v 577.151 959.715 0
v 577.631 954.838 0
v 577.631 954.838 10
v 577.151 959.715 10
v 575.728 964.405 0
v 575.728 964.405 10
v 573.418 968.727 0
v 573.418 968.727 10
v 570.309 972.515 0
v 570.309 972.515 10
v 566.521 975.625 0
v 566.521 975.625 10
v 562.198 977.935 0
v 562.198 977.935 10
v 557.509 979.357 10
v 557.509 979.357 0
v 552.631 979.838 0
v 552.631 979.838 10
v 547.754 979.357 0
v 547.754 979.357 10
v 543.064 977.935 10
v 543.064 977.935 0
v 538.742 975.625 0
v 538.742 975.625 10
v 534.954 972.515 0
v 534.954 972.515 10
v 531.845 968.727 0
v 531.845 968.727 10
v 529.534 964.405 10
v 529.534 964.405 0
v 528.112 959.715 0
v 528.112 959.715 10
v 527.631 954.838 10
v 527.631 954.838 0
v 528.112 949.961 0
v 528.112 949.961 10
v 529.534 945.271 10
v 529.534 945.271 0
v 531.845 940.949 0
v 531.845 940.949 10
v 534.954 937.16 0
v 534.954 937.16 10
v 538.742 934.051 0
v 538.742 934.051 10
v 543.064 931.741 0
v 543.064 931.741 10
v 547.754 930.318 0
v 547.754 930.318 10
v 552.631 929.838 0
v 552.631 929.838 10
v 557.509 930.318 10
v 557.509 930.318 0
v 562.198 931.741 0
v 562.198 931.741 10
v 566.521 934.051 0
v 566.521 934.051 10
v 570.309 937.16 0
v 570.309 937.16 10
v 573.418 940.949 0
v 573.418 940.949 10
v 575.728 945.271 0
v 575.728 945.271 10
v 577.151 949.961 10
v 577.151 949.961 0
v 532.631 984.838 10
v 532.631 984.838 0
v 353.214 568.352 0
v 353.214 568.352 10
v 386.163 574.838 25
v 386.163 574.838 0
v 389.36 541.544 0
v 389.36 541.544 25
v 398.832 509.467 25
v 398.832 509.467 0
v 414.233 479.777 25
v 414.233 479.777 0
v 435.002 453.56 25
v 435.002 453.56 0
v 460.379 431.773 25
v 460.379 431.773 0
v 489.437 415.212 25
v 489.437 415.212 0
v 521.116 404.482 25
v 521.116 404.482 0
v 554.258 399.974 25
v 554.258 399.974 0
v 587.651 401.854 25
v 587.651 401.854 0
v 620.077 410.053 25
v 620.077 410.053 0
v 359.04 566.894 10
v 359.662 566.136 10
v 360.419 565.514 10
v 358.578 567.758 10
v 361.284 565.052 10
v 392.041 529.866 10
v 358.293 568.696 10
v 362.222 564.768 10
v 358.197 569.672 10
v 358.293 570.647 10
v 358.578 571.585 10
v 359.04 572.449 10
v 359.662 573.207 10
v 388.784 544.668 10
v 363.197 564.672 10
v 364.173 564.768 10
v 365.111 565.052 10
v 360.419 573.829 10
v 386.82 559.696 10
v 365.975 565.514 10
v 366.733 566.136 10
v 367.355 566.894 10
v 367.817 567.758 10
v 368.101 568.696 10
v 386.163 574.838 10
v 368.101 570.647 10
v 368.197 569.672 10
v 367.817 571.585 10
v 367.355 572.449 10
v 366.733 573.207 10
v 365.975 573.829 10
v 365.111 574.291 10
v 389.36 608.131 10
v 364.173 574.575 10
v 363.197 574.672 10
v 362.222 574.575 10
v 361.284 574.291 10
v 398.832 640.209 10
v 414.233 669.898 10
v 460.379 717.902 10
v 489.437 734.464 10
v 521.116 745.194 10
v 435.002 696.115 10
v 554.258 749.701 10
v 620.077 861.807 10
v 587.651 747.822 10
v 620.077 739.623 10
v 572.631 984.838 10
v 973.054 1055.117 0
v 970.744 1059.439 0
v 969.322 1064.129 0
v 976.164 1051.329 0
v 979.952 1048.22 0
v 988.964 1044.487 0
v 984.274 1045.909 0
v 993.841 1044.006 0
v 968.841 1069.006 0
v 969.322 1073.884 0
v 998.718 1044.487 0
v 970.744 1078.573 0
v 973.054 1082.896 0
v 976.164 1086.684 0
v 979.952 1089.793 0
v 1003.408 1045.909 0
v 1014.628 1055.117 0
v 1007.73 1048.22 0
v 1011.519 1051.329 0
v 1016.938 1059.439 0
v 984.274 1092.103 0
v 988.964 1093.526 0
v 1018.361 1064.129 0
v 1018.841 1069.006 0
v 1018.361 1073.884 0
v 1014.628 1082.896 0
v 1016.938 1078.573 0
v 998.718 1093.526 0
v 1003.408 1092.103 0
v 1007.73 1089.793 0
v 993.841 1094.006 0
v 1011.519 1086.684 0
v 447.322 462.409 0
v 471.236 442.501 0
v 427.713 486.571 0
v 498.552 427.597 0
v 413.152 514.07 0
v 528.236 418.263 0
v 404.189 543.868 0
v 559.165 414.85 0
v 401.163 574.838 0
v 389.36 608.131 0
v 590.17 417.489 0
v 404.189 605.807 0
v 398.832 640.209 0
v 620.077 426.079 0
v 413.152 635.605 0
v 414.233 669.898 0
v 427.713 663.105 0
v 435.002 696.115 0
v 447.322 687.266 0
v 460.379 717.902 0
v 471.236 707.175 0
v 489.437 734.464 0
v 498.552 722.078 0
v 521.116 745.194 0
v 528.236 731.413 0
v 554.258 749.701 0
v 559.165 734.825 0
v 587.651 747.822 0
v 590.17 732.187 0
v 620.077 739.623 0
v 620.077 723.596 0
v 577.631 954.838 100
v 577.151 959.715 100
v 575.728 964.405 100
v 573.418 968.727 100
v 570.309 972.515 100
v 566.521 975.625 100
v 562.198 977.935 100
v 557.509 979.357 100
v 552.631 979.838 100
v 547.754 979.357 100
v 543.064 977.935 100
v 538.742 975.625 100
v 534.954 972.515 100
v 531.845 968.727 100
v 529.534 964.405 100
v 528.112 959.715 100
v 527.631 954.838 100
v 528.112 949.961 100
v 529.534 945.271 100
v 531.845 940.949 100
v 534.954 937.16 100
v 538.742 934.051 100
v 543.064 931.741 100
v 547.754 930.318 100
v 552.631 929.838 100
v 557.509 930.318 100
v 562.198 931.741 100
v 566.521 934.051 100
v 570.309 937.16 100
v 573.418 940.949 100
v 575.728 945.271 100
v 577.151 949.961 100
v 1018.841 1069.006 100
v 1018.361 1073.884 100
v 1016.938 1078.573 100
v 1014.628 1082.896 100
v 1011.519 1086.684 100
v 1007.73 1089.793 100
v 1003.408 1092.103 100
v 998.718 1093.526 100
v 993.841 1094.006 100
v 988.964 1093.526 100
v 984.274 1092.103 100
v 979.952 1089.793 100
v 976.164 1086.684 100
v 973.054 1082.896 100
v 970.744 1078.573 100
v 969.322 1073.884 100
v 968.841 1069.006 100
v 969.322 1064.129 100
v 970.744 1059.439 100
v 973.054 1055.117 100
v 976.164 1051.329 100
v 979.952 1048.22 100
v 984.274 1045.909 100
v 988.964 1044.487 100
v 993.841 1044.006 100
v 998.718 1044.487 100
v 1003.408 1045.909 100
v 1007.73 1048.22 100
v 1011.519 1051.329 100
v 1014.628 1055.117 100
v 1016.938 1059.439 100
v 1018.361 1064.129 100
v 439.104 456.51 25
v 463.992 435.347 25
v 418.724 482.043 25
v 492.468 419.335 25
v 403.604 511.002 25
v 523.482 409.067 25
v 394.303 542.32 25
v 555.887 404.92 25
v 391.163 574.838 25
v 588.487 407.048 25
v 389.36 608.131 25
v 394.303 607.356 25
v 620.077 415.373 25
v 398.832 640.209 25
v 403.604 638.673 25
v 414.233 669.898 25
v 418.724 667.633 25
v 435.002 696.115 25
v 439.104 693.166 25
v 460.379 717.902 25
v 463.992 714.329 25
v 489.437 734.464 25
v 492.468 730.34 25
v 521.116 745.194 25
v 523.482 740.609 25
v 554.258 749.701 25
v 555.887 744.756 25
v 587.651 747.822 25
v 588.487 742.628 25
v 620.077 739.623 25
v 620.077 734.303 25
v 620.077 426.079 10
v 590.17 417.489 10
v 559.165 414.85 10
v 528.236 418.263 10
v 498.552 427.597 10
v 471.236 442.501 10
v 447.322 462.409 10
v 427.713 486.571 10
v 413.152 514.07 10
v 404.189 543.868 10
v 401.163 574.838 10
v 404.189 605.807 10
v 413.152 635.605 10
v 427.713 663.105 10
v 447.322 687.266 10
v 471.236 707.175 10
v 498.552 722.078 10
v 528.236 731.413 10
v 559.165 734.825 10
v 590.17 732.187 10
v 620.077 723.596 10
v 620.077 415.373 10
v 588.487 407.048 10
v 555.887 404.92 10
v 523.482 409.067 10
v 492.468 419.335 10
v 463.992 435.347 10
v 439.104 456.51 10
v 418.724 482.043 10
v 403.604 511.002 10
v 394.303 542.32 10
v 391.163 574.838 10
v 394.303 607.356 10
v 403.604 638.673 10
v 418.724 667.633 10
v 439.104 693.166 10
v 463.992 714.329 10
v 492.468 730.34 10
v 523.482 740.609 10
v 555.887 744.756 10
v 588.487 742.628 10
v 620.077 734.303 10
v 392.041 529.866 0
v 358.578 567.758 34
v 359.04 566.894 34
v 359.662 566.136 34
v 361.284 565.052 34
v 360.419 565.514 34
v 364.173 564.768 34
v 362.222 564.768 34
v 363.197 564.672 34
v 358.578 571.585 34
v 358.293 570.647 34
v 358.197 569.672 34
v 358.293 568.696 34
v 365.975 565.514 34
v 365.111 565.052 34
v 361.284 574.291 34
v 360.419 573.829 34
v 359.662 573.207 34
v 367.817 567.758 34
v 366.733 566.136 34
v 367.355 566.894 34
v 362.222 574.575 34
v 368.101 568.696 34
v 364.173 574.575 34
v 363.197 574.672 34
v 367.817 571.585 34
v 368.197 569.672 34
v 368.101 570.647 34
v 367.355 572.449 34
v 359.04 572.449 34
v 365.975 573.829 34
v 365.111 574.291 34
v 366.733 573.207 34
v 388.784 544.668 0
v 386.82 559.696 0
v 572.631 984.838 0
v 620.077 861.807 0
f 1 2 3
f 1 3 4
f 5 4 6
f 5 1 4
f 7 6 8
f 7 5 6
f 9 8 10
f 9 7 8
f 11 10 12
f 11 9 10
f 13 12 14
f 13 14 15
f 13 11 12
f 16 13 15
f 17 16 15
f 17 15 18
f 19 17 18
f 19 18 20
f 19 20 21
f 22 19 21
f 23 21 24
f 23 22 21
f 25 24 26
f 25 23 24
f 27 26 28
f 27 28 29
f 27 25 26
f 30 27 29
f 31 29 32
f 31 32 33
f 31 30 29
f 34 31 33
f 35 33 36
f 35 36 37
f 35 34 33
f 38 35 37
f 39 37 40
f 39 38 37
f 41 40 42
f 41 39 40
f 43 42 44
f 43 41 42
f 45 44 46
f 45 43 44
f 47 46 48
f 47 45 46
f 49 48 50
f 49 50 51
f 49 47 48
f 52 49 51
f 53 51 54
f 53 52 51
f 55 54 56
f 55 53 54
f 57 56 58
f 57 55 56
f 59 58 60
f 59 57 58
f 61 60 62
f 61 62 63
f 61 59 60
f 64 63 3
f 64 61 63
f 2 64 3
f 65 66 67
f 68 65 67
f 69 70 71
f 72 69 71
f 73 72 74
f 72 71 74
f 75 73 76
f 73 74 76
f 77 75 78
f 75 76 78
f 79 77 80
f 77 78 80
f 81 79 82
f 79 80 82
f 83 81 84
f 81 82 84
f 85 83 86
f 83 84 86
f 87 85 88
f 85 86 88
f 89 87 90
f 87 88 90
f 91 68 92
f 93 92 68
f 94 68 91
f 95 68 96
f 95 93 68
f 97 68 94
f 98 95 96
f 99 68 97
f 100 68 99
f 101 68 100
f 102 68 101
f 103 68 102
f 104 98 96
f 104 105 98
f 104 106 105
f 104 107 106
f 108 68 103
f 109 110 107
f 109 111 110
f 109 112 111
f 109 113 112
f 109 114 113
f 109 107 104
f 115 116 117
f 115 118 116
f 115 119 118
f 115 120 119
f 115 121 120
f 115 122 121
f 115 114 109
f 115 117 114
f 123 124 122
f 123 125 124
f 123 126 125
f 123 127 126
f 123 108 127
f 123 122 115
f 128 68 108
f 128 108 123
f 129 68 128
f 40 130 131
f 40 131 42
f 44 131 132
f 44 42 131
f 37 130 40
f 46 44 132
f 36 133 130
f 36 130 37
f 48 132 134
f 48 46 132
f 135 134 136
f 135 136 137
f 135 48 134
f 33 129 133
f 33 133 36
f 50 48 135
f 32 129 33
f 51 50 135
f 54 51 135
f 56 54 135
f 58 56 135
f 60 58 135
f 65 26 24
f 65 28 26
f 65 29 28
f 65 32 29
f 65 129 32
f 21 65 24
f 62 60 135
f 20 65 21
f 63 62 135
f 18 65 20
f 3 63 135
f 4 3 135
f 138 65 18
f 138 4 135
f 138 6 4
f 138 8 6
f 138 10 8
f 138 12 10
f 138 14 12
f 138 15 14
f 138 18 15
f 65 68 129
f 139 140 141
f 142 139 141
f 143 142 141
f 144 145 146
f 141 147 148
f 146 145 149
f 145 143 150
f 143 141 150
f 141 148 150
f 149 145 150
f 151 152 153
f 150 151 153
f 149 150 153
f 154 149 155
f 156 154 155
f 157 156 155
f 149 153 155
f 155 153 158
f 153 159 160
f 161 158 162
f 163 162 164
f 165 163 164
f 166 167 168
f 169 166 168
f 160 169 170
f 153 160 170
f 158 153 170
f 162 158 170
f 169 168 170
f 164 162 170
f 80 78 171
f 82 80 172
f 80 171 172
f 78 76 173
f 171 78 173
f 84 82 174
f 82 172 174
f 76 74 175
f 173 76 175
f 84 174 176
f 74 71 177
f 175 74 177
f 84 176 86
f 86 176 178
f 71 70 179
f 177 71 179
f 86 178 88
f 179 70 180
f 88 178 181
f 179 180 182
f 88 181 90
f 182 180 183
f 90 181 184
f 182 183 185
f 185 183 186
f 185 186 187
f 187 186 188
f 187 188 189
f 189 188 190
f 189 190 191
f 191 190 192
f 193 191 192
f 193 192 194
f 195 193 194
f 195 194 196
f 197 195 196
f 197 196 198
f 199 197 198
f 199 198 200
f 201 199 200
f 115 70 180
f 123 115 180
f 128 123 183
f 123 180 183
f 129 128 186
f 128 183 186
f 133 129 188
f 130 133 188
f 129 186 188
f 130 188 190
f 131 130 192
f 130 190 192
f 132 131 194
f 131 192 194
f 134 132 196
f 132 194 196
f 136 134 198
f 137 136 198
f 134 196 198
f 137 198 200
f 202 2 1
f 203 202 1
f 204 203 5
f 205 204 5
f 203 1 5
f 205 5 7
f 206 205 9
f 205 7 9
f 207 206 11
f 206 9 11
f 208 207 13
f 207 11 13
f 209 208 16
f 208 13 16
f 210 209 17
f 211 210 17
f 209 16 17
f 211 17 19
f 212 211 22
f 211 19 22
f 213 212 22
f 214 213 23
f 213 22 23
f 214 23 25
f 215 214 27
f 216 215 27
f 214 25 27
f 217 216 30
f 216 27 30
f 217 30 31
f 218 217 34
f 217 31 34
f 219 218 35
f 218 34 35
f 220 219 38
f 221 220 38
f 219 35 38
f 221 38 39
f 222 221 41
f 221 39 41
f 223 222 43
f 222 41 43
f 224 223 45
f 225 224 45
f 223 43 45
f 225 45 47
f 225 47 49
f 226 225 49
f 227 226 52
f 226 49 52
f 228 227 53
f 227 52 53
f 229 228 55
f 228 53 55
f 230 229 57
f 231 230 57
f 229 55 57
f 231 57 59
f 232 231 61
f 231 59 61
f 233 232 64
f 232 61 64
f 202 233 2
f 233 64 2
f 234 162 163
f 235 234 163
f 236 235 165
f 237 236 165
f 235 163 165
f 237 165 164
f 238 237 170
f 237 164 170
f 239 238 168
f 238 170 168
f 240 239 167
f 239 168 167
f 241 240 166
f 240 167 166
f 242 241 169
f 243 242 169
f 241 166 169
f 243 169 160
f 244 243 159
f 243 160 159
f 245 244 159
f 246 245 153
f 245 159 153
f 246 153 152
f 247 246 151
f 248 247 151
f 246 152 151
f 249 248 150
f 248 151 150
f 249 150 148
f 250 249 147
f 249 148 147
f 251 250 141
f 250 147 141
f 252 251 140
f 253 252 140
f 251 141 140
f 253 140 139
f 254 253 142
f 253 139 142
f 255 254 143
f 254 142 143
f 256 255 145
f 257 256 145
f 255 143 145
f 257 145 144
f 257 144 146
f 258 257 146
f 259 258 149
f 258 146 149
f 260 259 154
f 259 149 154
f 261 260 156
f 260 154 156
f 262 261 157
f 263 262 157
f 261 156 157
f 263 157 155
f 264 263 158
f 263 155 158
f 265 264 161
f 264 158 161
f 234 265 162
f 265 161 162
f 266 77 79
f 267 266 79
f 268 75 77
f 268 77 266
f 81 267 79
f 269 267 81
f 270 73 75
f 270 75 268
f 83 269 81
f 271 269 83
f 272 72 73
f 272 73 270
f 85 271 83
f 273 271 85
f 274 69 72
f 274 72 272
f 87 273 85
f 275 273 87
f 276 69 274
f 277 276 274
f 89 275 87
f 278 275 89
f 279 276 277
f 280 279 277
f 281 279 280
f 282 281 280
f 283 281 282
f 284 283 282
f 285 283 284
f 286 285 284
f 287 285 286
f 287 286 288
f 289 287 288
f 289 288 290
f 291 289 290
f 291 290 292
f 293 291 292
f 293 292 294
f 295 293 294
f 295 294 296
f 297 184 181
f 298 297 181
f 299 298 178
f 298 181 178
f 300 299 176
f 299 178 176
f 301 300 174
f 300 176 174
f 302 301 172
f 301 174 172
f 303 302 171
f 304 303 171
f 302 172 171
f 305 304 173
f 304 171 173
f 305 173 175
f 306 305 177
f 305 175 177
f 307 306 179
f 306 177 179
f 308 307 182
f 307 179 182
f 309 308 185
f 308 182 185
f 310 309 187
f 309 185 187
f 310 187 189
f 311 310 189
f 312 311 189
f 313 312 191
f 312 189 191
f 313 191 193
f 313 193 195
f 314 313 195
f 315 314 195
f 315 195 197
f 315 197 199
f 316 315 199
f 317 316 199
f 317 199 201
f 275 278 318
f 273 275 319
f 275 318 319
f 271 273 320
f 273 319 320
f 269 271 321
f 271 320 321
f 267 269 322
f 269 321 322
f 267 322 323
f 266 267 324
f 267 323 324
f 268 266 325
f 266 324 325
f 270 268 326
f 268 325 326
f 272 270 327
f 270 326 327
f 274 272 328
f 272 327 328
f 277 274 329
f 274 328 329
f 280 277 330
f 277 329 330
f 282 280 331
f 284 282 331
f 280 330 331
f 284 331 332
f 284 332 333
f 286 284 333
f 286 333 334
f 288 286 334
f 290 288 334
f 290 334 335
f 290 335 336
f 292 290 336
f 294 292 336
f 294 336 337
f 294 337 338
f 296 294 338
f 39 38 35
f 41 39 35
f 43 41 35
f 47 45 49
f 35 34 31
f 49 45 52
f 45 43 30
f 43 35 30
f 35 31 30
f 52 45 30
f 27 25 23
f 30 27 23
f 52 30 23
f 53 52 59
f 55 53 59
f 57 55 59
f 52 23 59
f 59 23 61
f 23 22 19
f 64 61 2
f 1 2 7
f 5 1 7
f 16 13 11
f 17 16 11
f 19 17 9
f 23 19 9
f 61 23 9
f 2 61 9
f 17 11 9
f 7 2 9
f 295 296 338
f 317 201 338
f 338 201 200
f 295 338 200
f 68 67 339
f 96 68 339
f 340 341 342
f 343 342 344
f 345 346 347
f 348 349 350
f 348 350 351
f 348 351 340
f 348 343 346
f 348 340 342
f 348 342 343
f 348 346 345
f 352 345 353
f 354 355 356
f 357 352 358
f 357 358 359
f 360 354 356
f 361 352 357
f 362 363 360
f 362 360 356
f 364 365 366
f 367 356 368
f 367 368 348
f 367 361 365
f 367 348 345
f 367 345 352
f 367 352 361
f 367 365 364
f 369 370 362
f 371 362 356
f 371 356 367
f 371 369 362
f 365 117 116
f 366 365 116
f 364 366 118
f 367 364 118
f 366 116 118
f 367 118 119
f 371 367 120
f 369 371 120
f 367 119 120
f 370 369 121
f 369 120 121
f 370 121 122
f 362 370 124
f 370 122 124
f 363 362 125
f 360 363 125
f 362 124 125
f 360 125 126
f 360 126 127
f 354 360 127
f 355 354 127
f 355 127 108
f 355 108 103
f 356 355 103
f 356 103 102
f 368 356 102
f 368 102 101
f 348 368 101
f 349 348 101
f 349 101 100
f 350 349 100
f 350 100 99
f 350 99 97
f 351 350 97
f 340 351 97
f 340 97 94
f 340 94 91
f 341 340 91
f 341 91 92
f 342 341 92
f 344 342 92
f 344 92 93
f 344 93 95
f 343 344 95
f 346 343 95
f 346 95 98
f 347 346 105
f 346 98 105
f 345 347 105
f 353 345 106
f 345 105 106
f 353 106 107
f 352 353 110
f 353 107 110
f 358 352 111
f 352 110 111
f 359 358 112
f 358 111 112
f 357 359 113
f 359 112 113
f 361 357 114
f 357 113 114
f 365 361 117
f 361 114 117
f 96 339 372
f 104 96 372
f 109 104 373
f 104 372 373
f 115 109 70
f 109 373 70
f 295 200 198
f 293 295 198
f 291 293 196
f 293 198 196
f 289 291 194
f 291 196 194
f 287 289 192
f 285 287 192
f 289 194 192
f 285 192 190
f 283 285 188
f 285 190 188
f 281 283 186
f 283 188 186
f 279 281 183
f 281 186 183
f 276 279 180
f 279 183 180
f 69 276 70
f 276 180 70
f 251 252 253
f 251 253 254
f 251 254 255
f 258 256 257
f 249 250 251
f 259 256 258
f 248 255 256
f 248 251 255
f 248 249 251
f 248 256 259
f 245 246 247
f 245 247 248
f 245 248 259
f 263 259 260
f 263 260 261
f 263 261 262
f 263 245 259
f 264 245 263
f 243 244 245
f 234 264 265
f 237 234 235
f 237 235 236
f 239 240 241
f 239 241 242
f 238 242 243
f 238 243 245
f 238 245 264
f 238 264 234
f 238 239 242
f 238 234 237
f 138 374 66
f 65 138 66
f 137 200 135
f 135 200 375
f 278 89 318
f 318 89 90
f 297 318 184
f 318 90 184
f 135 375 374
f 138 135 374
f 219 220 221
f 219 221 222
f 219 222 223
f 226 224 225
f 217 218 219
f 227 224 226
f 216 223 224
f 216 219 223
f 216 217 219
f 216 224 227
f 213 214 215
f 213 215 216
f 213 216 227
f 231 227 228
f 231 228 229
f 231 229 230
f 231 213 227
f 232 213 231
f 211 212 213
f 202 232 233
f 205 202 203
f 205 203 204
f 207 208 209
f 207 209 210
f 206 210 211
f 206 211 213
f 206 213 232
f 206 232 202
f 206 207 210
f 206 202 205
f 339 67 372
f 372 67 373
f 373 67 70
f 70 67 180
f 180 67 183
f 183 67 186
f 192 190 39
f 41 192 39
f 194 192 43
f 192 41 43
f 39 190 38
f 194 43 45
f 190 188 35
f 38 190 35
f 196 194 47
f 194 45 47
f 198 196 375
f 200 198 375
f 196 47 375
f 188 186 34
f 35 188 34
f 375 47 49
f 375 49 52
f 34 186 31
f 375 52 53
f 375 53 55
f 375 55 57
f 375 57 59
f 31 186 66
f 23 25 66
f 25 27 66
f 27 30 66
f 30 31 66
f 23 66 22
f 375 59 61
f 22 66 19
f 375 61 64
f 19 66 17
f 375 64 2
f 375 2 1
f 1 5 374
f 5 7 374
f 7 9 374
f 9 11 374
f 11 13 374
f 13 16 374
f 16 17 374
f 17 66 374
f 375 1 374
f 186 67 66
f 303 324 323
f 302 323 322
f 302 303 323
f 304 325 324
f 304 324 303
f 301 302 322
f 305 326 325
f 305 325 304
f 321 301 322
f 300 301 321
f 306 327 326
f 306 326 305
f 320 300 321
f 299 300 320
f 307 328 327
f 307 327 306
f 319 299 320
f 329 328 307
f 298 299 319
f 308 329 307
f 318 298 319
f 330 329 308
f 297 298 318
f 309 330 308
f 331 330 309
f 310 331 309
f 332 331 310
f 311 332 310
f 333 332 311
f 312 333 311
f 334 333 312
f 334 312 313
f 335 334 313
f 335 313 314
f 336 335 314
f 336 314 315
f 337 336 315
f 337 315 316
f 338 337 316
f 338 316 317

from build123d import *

# Parameters (mm, degrees)
F1_DEPTH = 10
F2_DEPTH = 25
F0_R     = 25
F3_DEPTH = 100
F0_R_2   = 5
F4_DEPTH = 10
F5_DEPTH = 34
F6_DEPTH = 100


# Not quite as in the source:
# - a feature names something its author has since deleted; it is built from what else it names


with BuildPart() as f1:
    # F0 (on Top) → F1 (new body)
    with BuildSketch(Plane.XY):
        with BuildLine():
            Line((620.0774312019, 723.5964589473), (620.0774312019, 734.3029628668))
            ThreePointArc((620.0774312019, 734.3029628668), (391.1634666106, 574.8377792808), (620.0774312019, 415.3725956948))
            Line((620.0774312019, 415.3725956948), (620.0774312019, 426.0790996143))
            ThreePointArc((620.0774312019, 426.0790996143), (401.1634666106, 574.8377792808), (620.0774312019, 723.5964589473))
        make_face()
    extrude(amount=F1_DEPTH)

    # F0 (on Top) → F2 (join)
    with BuildSketch(Plane.XY):
        with BuildLine():
            Line((620.0774312019, 734.3029628668), (620.0774312019, 739.6229265973))
            ThreePointArc((620.0774312019, 739.6229265973), (460.3789038132, 717.9023517708), (386.1634666106, 574.8377792808))
            ThreePointArc((386.1634666106, 574.8377792808), (387.6389733709, 552.1606929179), (392.0406122781, 529.8660087749))
            ThreePointArc((392.0406122781, 529.8660087749), (479.7674522107, 419.9194497009), (620.0774312019, 410.0526319643))
            Line((620.0774312019, 410.0526319643), (620.0774312019, 415.3725956948))
            ThreePointArc((620.0774312019, 415.3725956948), (391.1634666106, 574.8377792808), (620.0774312019, 734.3029628668))
        make_face()
    extrude(amount=F2_DEPTH)


with BuildPart() as f3:
    # F0 (on Top) → F3 (new body)
    with BuildSketch(Plane.XY):
        with Locations((552.6312583531, 954.8377792808)):
            Circle(F0_R)
    extrude(amount=F3_DEPTH)


with BuildPart() as f4:
    # F0 (on Top) → F4 (new body)
    with BuildSketch(Plane.XY):
        with BuildLine():
            ThreePointArc((392.0406122781, 529.8660087749), (387.6389733709, 552.1606929179), (386.1634666106, 574.8377792808))
            Line((386.1634666106, 574.8377792808), (386.1634666106, 644.8377792808))
            Line((386.1634666106, 644.8377792808), (353.2142043114, 568.3516860008))
            Line((353.2142043114, 568.3516860008), (392.0406122781, 529.8660087749))
        make_face()
        with Locations((363.1972372532, 569.6715116501)):
            Circle(F0_R_2, mode=Mode.SUBTRACT)
        with BuildLine():
            ThreePointArc((386.1634666106, 574.8377792808), (460.3789038132, 717.9023517708), (620.0774312019, 739.6229265973))
            Line((620.0774312019, 739.6229265973), (620.0774312019, 861.8070483208))
            Line((620.0774312019, 861.8070483208), (572.6312583531, 984.8377792808))
            Line((572.6312583531, 984.8377792808), (532.6312583531, 984.8377792808))
            Line((532.6312583531, 984.8377792808), (386.1634666106, 644.8377792808))
            Line((386.1634666106, 644.8377792808), (386.1634666106, 574.8377792808))
        make_face()
        with Locations((552.6312583531, 954.8377792808)):
            Circle(F0_R, mode=Mode.SUBTRACT)
    extrude(amount=F4_DEPTH)

    # F0 (on Top) → F5 (join)
    with BuildSketch(Plane.XY):
        with Locations((363.1972372532, 569.6715116501)):
            Circle(F0_R_2)
    extrude(amount=F5_DEPTH)


with BuildPart() as f6:
    # F0 (on Top) → F6 (new body)
    with BuildSketch(Plane.XY):
        with Locations((993.8411712646, 1069.0063238144)):
            Circle(F0_R)
    extrude(amount=F6_DEPTH)


solid = Compound([f1.part, f3.part, f4.part, f6.part])
